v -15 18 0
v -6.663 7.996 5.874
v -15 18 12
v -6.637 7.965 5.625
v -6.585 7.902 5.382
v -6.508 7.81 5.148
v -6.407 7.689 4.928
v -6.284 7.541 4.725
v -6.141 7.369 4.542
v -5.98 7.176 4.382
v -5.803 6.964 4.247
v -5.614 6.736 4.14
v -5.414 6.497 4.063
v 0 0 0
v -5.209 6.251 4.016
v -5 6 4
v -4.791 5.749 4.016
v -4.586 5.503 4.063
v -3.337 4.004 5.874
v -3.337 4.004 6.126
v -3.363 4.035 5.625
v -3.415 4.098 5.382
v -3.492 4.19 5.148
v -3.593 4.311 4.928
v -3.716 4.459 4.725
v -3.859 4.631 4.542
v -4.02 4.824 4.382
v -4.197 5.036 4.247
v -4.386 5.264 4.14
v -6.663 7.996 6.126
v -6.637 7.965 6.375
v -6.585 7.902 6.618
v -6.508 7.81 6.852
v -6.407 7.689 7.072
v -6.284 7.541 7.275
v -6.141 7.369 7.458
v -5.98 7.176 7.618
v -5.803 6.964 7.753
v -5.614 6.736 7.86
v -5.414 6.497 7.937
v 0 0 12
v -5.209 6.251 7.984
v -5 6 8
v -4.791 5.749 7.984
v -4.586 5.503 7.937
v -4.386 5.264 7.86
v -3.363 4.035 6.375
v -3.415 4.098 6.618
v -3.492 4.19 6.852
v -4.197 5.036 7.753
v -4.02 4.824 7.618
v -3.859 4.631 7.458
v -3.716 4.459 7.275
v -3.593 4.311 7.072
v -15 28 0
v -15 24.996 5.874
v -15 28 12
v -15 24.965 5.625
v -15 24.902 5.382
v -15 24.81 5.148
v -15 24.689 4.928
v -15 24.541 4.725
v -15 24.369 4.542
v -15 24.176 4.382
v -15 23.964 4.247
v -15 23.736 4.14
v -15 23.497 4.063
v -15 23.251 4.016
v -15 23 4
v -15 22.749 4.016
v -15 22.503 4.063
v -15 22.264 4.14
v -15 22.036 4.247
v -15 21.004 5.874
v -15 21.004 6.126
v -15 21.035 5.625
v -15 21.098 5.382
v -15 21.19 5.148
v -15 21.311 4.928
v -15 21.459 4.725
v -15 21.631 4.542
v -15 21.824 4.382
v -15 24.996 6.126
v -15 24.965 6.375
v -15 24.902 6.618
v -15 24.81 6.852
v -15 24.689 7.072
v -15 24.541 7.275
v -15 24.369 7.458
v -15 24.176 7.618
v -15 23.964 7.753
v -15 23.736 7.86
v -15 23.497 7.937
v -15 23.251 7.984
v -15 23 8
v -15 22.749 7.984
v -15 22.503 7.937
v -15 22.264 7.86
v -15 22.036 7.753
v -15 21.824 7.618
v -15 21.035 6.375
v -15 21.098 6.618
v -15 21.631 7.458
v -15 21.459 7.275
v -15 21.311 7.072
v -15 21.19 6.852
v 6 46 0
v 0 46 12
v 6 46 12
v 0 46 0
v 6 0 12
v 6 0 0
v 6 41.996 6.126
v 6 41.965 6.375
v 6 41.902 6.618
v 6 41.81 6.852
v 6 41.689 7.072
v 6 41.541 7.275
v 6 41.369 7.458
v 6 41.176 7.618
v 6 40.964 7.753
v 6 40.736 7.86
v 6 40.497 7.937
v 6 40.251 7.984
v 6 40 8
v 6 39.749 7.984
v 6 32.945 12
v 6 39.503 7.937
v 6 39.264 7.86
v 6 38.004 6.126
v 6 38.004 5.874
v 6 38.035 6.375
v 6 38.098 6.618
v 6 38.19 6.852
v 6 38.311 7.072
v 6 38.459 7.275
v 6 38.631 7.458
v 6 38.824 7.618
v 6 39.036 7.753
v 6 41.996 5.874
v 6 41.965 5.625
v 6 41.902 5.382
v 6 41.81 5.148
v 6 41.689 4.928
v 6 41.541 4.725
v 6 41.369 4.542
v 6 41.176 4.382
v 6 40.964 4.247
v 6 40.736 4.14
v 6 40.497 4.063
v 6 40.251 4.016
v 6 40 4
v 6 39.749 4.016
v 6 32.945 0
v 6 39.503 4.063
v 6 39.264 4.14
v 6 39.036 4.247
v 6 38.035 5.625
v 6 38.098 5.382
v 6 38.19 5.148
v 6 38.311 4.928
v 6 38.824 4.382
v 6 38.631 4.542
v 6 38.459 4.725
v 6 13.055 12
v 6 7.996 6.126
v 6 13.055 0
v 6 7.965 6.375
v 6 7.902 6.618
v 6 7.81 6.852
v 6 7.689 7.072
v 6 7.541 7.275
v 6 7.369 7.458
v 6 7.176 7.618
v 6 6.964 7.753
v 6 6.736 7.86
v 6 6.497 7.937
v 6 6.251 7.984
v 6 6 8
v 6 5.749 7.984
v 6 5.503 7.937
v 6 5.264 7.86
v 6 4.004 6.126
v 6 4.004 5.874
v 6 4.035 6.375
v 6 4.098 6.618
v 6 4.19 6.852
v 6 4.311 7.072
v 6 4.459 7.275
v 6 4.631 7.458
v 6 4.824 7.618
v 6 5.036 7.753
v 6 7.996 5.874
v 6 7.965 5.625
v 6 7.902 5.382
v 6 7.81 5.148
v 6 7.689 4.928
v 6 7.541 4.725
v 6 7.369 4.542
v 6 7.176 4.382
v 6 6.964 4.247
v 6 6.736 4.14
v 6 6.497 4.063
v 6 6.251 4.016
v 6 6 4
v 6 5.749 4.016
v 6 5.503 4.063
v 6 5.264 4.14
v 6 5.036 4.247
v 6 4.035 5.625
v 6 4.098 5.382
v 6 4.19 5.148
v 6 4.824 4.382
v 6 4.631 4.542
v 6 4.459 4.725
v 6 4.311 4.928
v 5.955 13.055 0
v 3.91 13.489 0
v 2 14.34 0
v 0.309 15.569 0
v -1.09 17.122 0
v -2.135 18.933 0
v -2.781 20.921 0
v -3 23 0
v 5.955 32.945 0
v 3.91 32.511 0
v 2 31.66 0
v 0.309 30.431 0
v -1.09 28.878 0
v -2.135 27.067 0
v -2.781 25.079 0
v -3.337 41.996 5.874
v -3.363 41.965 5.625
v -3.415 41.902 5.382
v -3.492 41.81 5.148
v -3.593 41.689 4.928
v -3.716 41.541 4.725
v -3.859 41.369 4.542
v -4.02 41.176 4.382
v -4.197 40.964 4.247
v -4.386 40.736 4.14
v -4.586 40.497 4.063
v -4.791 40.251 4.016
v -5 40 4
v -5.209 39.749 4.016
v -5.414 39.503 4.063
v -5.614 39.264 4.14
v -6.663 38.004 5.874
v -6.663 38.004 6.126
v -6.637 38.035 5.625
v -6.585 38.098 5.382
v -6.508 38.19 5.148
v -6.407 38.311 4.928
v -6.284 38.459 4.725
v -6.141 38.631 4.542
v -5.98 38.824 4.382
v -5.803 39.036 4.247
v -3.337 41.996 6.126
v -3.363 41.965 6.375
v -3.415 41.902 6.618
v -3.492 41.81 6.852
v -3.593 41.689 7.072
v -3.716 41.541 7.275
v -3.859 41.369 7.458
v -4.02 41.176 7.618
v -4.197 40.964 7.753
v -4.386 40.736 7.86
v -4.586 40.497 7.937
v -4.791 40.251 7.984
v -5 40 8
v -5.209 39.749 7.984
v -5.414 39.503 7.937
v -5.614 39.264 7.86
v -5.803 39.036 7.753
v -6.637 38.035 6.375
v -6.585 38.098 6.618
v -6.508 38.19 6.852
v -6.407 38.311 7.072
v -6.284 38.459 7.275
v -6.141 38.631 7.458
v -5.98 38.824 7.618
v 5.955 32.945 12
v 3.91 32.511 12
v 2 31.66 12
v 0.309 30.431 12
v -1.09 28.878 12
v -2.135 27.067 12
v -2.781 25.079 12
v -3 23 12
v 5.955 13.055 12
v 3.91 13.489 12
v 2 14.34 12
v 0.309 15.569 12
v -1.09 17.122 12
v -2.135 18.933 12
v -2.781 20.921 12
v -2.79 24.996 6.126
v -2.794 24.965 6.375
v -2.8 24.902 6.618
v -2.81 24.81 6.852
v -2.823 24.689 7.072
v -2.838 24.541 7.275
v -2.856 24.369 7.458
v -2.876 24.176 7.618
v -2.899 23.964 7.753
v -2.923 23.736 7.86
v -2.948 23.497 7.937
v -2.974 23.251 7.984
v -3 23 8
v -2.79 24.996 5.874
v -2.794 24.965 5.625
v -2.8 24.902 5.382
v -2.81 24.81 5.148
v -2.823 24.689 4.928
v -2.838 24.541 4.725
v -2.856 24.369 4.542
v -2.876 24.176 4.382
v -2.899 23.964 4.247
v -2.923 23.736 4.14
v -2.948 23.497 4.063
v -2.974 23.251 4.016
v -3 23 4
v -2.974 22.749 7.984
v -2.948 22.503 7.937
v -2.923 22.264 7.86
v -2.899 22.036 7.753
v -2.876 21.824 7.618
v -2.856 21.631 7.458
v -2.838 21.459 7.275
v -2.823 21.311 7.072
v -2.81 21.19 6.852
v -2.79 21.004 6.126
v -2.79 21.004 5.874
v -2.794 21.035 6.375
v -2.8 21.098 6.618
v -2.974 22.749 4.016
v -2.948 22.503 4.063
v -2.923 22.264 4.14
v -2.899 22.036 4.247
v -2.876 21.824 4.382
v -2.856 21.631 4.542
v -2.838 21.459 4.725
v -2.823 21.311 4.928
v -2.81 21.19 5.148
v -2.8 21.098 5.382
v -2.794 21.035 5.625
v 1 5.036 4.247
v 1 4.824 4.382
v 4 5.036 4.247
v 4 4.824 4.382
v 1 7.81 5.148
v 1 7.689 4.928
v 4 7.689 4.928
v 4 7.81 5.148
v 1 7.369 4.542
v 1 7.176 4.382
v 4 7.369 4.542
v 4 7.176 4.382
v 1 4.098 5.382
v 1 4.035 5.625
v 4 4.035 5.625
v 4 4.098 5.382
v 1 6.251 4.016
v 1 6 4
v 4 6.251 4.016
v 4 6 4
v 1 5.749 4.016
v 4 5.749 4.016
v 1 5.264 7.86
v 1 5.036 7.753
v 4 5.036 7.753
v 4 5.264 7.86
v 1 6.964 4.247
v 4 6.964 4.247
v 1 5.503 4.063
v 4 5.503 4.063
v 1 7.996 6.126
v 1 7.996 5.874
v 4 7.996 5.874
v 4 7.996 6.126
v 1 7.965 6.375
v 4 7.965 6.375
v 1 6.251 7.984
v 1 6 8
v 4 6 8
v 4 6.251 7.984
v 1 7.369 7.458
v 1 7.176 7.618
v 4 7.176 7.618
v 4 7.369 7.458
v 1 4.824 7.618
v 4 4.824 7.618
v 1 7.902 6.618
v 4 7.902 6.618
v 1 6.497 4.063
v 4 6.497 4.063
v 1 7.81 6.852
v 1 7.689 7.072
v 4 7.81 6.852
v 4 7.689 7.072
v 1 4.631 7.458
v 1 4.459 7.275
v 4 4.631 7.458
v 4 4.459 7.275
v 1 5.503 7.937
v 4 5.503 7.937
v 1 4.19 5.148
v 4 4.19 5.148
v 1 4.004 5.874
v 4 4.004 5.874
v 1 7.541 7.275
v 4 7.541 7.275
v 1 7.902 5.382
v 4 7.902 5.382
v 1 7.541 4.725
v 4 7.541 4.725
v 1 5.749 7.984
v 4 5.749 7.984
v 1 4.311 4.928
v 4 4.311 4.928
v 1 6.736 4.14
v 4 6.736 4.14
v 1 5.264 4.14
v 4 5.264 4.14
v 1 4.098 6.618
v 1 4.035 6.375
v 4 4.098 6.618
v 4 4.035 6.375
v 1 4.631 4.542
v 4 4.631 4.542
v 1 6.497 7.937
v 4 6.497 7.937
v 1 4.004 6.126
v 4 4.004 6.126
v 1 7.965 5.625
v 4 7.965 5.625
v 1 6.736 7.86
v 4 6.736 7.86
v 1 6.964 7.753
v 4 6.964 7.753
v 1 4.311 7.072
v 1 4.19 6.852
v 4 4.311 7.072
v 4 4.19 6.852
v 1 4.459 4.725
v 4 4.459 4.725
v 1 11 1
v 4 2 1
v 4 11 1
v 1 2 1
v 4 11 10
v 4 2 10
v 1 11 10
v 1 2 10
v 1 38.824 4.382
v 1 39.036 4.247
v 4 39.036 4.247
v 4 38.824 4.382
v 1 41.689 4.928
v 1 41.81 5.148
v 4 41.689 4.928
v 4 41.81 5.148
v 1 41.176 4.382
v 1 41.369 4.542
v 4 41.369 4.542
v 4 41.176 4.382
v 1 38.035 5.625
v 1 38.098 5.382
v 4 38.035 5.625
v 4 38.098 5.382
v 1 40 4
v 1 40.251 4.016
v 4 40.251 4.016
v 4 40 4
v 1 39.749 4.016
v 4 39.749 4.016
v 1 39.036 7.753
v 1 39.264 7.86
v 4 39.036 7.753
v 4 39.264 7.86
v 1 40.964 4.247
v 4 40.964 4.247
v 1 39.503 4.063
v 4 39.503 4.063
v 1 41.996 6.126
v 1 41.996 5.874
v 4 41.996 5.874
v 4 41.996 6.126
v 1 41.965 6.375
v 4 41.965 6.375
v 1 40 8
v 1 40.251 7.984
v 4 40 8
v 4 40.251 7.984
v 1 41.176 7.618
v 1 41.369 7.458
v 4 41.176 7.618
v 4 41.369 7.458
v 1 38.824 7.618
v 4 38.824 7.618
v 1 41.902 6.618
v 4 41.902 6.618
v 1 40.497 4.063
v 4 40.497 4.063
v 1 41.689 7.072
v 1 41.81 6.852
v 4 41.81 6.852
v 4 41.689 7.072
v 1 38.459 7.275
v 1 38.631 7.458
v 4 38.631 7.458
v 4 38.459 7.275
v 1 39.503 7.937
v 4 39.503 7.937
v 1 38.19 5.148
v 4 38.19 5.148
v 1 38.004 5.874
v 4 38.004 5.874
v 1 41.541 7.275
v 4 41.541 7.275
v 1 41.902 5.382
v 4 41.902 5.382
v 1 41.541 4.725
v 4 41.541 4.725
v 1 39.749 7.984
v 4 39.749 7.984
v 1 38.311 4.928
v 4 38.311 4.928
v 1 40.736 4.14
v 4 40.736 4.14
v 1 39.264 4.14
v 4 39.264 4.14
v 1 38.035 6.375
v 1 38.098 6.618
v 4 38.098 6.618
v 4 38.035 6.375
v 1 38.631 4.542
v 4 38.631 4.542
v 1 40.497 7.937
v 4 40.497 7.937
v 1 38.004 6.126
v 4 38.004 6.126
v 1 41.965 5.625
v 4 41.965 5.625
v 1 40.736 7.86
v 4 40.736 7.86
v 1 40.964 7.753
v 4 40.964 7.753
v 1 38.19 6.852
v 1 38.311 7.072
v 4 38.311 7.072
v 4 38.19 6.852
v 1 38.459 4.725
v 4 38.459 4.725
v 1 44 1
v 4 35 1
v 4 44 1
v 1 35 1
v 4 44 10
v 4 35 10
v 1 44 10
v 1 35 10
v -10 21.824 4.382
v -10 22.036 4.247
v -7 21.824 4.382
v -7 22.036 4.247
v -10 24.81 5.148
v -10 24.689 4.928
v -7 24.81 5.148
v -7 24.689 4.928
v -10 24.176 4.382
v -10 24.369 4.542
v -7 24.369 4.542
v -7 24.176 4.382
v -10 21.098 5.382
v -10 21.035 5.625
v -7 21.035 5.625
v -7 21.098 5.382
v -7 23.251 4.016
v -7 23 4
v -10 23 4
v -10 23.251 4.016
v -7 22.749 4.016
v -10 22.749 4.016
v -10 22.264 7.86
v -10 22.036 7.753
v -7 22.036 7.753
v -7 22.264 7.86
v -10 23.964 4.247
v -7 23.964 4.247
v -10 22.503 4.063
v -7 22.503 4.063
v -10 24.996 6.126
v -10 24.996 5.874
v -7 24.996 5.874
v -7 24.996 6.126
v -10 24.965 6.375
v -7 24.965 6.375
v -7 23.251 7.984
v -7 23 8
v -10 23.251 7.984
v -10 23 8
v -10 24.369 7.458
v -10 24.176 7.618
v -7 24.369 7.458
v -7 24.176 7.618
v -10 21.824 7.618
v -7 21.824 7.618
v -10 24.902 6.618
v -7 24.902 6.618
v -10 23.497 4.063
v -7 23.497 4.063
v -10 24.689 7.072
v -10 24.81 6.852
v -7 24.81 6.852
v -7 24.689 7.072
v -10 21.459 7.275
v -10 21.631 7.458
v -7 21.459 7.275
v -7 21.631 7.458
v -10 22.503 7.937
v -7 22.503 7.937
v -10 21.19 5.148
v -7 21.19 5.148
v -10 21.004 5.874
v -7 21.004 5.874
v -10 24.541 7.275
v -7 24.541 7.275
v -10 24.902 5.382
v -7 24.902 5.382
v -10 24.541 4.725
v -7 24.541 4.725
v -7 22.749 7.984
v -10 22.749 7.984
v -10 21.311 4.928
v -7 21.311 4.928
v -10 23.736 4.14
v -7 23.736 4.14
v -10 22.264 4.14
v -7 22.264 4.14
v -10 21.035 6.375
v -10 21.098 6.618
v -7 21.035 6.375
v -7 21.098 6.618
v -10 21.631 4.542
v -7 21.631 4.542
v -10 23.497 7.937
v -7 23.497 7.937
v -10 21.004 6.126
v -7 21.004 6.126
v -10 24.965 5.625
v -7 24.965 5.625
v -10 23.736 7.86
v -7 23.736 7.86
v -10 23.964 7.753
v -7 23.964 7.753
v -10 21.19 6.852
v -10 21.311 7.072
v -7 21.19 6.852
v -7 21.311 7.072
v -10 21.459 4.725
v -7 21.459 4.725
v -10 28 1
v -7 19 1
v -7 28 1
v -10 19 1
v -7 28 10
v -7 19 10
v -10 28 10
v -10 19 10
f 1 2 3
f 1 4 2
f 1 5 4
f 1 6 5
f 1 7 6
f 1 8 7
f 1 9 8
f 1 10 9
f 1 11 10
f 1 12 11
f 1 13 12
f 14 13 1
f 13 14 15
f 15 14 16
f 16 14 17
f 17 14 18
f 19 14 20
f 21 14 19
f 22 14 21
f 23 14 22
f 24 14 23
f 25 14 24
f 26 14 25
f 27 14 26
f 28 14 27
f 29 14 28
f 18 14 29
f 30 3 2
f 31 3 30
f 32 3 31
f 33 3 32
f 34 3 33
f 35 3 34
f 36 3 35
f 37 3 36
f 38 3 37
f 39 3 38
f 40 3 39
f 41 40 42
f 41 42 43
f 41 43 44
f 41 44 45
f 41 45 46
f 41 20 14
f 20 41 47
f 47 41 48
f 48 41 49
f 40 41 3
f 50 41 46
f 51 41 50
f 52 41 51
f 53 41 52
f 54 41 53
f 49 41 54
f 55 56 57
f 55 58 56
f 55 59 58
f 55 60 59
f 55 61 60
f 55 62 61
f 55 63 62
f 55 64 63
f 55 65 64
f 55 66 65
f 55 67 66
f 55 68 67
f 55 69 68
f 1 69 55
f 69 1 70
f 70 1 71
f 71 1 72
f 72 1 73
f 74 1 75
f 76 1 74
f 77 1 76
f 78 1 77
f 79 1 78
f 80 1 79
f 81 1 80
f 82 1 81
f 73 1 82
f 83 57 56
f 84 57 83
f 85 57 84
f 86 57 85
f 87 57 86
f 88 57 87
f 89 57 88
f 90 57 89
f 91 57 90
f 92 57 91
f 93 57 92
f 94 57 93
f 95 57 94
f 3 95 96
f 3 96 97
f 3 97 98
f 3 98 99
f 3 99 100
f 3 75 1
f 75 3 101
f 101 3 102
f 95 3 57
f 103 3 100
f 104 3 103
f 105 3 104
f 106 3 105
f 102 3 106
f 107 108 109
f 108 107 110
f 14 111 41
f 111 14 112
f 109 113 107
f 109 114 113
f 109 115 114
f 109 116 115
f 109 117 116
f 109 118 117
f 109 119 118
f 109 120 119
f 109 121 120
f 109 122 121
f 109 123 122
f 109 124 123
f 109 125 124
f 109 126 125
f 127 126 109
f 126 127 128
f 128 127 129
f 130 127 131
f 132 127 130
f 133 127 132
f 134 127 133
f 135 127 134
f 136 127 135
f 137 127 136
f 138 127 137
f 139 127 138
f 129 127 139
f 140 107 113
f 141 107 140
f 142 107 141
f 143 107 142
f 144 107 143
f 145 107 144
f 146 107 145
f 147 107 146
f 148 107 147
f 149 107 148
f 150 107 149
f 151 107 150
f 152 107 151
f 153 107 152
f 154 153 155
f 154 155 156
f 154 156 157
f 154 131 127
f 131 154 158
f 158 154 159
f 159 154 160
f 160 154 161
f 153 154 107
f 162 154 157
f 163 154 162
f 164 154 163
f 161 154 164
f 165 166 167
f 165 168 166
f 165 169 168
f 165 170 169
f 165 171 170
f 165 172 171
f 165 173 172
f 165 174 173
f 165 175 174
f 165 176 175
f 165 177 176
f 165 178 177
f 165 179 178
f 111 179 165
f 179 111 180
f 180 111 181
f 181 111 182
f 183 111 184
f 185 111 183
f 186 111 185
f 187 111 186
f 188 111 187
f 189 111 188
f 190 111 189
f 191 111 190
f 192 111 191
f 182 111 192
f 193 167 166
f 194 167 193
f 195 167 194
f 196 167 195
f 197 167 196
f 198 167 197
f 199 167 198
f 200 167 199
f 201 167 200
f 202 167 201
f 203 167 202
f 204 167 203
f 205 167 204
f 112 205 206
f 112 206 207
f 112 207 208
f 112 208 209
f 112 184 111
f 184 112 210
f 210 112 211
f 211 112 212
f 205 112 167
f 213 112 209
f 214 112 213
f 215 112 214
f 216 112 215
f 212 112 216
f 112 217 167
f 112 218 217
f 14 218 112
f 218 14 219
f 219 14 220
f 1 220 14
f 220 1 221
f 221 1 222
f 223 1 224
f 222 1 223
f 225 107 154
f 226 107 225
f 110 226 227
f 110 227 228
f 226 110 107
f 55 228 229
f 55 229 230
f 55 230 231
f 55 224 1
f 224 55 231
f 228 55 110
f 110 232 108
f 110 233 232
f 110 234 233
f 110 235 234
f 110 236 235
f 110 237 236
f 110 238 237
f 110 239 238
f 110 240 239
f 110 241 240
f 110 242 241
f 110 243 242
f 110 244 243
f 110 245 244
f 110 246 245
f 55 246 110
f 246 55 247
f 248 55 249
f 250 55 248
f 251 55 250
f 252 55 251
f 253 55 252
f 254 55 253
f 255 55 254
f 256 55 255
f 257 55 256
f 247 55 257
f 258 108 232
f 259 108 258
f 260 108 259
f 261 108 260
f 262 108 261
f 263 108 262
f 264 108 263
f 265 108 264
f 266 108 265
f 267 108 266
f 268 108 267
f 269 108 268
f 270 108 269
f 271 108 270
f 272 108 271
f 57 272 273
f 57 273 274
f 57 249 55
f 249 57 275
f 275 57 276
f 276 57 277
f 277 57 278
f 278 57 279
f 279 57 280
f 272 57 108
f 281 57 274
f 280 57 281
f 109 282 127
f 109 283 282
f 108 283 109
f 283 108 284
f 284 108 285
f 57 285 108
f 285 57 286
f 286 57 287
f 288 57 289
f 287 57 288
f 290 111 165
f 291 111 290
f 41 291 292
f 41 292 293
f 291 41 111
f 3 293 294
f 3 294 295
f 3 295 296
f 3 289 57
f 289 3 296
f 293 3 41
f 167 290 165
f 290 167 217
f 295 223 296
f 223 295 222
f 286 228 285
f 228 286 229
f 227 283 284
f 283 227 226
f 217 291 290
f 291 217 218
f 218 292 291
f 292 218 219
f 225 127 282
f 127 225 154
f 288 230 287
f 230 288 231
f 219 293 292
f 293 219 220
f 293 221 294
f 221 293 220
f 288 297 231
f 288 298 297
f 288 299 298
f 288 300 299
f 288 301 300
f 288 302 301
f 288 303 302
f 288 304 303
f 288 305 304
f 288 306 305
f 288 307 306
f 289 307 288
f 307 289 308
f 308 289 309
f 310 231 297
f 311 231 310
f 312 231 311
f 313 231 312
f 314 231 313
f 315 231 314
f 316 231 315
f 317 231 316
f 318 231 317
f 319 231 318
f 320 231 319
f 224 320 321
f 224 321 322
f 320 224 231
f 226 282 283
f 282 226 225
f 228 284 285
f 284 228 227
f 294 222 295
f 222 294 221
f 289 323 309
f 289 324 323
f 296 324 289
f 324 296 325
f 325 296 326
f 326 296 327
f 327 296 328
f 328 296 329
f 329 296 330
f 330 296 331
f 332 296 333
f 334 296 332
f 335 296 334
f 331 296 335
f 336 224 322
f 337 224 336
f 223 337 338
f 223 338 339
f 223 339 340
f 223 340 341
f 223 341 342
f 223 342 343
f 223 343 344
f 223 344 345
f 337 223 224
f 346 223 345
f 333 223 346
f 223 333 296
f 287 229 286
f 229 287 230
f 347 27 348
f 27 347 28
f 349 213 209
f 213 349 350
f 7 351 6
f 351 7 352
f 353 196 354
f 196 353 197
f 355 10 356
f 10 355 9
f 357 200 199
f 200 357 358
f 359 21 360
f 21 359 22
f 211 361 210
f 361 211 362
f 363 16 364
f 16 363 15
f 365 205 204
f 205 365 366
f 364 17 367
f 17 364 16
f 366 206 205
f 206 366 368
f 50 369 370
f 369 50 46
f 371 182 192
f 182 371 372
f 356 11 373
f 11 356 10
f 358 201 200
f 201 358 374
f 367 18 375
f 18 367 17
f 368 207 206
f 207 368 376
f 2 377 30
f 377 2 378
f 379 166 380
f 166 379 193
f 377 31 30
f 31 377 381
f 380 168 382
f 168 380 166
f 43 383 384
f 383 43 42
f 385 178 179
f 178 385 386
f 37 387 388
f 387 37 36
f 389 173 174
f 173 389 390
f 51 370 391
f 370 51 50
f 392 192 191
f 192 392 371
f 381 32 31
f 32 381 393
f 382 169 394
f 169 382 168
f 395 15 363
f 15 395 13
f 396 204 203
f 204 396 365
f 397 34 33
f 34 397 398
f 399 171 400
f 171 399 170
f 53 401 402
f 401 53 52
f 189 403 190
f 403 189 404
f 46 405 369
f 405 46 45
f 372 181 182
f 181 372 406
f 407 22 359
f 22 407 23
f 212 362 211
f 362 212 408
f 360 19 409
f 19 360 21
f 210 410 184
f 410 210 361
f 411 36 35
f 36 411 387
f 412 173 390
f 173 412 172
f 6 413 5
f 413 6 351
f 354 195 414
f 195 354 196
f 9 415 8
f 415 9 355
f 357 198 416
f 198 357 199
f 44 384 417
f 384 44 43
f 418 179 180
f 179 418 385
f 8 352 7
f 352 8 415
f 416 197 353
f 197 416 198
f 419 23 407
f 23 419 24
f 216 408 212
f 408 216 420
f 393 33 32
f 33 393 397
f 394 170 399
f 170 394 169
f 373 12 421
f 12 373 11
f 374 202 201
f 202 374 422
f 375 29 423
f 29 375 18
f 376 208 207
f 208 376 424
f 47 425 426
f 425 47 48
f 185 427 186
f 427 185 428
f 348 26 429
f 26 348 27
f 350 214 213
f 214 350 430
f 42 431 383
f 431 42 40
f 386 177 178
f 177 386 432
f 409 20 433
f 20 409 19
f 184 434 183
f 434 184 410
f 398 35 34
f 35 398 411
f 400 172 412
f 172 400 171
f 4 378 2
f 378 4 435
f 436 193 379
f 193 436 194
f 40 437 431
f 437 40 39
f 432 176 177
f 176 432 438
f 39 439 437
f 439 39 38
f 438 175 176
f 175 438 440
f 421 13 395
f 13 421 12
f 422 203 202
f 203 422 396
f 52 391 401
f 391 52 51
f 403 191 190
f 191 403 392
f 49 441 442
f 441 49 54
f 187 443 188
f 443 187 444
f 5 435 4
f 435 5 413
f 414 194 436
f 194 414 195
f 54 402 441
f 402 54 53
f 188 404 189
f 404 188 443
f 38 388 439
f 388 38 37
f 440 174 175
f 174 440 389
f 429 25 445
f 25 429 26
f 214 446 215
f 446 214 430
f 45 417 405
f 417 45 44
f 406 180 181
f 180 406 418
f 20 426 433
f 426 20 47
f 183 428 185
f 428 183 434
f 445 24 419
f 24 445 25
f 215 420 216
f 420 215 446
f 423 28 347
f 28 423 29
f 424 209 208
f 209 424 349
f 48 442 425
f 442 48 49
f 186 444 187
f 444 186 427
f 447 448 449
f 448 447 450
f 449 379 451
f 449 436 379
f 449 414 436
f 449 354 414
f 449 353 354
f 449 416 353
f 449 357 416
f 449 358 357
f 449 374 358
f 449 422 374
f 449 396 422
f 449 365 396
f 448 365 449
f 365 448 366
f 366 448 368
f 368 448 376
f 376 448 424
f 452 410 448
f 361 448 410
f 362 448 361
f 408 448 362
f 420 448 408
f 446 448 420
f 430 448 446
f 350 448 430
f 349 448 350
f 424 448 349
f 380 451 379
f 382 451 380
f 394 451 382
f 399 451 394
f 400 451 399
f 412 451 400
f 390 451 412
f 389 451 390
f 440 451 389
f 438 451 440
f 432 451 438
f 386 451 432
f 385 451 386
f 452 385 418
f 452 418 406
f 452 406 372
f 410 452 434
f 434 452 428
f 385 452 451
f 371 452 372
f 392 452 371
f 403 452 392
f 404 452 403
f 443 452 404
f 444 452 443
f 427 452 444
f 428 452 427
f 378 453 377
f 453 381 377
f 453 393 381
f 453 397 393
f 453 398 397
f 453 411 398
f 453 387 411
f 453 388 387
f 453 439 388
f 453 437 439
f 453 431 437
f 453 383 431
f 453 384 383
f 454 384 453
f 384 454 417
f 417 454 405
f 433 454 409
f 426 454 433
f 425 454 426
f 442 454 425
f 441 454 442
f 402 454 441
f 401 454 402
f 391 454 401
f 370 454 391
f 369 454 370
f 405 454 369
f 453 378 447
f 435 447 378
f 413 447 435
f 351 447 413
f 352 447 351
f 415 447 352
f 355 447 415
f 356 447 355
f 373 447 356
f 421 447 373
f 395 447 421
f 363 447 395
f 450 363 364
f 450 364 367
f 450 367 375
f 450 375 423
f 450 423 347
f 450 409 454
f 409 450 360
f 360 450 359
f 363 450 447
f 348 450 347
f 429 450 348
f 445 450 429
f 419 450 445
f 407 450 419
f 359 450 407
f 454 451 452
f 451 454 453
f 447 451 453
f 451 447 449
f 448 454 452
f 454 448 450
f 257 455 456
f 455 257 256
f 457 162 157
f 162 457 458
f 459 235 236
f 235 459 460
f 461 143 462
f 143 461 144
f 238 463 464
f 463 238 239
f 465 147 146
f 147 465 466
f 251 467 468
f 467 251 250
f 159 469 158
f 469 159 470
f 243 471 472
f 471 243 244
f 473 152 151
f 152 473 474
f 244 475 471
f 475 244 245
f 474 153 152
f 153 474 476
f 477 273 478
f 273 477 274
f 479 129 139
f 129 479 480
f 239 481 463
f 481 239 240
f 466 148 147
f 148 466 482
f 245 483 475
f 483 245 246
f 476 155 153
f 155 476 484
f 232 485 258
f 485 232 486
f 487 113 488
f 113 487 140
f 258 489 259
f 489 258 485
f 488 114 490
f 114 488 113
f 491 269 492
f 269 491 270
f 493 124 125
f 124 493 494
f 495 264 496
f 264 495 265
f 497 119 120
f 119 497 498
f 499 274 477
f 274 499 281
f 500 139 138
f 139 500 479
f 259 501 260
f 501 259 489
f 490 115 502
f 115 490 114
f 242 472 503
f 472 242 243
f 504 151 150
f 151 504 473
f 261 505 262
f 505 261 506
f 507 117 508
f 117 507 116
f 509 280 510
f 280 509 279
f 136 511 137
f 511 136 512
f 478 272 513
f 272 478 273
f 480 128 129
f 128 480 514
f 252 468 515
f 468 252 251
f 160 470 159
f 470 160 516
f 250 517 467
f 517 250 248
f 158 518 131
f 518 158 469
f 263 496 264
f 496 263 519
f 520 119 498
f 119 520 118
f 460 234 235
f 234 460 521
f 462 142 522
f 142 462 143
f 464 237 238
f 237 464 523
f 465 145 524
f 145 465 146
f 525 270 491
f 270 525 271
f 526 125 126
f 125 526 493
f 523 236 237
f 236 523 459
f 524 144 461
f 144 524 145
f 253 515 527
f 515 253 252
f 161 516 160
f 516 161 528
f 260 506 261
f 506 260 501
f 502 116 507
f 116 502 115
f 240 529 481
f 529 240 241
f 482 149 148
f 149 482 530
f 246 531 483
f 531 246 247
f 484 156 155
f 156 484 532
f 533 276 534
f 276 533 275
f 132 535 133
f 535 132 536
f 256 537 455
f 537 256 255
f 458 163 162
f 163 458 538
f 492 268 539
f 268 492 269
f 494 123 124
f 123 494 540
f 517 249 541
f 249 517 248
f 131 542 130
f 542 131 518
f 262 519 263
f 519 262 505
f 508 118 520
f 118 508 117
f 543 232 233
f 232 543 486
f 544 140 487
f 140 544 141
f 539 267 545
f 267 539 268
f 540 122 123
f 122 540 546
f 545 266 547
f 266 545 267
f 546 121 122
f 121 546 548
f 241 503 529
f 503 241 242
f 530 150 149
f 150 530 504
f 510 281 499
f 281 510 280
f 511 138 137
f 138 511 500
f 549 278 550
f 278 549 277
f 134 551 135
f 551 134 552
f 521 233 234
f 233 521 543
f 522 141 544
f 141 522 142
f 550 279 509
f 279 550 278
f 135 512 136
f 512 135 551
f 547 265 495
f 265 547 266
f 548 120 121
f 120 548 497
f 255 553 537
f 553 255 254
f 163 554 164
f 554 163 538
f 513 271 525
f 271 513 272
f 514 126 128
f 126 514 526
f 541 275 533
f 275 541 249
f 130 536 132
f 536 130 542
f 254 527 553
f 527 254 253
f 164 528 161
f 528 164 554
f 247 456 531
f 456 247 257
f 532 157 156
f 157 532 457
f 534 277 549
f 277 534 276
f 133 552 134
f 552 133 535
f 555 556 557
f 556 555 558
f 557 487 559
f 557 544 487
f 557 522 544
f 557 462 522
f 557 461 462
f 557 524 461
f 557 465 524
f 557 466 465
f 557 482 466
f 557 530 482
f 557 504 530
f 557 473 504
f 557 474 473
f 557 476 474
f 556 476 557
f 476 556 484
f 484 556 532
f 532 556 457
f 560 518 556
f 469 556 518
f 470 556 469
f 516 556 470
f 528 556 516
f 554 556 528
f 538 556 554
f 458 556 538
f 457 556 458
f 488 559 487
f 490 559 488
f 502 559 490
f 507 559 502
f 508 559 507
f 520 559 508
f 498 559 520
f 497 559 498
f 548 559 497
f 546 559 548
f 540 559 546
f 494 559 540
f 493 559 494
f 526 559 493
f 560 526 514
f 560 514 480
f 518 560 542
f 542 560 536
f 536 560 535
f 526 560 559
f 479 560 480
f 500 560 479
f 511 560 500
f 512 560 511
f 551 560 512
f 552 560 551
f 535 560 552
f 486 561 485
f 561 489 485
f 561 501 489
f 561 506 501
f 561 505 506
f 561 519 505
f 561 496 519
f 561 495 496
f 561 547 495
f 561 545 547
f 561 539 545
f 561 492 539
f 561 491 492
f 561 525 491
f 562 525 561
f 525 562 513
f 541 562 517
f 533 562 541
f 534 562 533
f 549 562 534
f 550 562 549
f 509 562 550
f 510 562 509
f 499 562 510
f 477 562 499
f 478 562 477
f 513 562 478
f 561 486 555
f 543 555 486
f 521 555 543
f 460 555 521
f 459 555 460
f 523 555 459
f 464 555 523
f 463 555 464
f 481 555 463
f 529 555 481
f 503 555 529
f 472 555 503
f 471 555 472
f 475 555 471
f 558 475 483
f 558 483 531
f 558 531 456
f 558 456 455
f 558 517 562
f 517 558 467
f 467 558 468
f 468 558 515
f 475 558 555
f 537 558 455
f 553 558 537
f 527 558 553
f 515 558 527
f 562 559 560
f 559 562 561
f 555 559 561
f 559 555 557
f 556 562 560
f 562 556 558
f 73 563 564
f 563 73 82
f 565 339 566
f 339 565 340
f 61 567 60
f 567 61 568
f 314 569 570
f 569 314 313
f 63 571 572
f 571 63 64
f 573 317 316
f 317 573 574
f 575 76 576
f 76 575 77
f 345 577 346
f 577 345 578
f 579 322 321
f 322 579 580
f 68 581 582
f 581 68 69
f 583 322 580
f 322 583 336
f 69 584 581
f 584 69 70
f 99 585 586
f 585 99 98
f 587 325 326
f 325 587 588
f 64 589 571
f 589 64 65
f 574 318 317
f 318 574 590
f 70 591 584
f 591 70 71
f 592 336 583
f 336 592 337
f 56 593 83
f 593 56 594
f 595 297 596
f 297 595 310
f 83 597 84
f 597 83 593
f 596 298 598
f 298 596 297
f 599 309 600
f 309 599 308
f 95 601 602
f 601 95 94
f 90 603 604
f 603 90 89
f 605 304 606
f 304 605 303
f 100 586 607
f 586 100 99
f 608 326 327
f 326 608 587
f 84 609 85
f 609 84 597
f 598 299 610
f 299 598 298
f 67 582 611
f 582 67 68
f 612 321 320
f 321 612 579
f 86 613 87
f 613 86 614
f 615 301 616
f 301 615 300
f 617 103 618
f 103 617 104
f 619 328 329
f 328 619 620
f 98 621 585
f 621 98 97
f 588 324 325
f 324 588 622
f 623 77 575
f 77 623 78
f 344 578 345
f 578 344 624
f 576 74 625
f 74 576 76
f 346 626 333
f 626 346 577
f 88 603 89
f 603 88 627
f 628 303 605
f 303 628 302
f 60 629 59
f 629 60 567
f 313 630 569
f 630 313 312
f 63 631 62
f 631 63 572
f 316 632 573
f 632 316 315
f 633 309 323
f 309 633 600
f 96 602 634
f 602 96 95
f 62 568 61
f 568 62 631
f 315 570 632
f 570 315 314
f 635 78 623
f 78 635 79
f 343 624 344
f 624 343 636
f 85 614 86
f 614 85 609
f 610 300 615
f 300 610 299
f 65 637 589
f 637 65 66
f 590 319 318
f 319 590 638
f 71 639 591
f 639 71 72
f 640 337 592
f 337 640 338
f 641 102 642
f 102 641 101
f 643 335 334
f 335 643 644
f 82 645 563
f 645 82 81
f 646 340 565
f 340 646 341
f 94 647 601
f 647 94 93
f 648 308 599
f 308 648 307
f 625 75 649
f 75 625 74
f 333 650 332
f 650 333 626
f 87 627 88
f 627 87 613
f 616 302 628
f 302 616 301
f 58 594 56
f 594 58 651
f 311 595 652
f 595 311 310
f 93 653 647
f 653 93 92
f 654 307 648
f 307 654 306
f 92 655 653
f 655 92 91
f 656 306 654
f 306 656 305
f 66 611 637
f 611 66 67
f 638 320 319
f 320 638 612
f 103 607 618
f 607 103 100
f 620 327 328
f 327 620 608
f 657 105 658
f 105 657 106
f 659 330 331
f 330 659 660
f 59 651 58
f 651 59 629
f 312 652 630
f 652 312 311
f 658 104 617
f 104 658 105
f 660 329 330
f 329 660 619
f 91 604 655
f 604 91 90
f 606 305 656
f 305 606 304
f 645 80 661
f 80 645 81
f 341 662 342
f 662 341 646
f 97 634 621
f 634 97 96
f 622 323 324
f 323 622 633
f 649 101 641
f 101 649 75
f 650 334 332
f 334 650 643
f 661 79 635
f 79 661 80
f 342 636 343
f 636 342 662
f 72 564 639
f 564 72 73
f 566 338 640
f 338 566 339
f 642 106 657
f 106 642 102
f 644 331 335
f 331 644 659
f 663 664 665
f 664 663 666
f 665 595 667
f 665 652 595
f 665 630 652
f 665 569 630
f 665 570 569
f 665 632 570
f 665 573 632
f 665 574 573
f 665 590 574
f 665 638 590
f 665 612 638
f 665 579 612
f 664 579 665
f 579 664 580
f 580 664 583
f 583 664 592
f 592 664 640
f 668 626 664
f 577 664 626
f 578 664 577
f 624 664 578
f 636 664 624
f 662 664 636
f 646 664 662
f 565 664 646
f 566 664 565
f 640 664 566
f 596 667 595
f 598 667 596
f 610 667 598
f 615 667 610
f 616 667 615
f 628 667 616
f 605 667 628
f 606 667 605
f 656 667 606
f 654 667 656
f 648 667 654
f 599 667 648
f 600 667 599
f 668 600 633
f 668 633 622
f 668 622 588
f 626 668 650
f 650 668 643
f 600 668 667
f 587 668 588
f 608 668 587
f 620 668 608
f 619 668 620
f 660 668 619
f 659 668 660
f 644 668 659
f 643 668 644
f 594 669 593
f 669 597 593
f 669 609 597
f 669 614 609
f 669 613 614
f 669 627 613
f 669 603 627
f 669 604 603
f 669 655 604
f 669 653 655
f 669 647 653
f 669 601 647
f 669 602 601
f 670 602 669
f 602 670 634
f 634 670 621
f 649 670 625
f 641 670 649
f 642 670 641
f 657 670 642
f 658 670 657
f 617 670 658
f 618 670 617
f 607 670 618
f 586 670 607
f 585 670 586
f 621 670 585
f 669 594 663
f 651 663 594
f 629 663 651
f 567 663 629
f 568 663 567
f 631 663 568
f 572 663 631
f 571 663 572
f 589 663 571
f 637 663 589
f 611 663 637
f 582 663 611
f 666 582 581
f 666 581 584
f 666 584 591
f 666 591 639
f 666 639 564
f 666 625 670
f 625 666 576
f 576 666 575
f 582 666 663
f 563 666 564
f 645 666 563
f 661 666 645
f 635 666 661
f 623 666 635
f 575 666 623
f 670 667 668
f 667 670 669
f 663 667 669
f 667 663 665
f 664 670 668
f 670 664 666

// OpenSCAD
// Pole Mount

difference () {
  hull () {
     cube([6,46,12]);
     translate ([-15,18,0]) cube([15,10,12]);
    }
  translate ([7,23,-1]) cylinder (h=14, r=10);
  translate ([-10, 6,6]) rotate ([0,90,0]) cylinder (h=20,r=2, $fn=50);
  translate ([1, 2,10]) rotate ([0,90,0]) cube([9,9,3]);
  translate ([-10, 40,6]) rotate ([0,90,0]) cylinder (h=20,r=2, $fn=50);
  translate ([1, 35,10]) rotate ([0,90,0]) cube([9,9,3]);
  translate ([-25, 23,6]) rotate ([0,90,0]) cylinder (h=25,r=2, $fn=50);
  translate ([-10, 19,10]) rotate ([0,90,0]) cube([9,9,3]);
}
